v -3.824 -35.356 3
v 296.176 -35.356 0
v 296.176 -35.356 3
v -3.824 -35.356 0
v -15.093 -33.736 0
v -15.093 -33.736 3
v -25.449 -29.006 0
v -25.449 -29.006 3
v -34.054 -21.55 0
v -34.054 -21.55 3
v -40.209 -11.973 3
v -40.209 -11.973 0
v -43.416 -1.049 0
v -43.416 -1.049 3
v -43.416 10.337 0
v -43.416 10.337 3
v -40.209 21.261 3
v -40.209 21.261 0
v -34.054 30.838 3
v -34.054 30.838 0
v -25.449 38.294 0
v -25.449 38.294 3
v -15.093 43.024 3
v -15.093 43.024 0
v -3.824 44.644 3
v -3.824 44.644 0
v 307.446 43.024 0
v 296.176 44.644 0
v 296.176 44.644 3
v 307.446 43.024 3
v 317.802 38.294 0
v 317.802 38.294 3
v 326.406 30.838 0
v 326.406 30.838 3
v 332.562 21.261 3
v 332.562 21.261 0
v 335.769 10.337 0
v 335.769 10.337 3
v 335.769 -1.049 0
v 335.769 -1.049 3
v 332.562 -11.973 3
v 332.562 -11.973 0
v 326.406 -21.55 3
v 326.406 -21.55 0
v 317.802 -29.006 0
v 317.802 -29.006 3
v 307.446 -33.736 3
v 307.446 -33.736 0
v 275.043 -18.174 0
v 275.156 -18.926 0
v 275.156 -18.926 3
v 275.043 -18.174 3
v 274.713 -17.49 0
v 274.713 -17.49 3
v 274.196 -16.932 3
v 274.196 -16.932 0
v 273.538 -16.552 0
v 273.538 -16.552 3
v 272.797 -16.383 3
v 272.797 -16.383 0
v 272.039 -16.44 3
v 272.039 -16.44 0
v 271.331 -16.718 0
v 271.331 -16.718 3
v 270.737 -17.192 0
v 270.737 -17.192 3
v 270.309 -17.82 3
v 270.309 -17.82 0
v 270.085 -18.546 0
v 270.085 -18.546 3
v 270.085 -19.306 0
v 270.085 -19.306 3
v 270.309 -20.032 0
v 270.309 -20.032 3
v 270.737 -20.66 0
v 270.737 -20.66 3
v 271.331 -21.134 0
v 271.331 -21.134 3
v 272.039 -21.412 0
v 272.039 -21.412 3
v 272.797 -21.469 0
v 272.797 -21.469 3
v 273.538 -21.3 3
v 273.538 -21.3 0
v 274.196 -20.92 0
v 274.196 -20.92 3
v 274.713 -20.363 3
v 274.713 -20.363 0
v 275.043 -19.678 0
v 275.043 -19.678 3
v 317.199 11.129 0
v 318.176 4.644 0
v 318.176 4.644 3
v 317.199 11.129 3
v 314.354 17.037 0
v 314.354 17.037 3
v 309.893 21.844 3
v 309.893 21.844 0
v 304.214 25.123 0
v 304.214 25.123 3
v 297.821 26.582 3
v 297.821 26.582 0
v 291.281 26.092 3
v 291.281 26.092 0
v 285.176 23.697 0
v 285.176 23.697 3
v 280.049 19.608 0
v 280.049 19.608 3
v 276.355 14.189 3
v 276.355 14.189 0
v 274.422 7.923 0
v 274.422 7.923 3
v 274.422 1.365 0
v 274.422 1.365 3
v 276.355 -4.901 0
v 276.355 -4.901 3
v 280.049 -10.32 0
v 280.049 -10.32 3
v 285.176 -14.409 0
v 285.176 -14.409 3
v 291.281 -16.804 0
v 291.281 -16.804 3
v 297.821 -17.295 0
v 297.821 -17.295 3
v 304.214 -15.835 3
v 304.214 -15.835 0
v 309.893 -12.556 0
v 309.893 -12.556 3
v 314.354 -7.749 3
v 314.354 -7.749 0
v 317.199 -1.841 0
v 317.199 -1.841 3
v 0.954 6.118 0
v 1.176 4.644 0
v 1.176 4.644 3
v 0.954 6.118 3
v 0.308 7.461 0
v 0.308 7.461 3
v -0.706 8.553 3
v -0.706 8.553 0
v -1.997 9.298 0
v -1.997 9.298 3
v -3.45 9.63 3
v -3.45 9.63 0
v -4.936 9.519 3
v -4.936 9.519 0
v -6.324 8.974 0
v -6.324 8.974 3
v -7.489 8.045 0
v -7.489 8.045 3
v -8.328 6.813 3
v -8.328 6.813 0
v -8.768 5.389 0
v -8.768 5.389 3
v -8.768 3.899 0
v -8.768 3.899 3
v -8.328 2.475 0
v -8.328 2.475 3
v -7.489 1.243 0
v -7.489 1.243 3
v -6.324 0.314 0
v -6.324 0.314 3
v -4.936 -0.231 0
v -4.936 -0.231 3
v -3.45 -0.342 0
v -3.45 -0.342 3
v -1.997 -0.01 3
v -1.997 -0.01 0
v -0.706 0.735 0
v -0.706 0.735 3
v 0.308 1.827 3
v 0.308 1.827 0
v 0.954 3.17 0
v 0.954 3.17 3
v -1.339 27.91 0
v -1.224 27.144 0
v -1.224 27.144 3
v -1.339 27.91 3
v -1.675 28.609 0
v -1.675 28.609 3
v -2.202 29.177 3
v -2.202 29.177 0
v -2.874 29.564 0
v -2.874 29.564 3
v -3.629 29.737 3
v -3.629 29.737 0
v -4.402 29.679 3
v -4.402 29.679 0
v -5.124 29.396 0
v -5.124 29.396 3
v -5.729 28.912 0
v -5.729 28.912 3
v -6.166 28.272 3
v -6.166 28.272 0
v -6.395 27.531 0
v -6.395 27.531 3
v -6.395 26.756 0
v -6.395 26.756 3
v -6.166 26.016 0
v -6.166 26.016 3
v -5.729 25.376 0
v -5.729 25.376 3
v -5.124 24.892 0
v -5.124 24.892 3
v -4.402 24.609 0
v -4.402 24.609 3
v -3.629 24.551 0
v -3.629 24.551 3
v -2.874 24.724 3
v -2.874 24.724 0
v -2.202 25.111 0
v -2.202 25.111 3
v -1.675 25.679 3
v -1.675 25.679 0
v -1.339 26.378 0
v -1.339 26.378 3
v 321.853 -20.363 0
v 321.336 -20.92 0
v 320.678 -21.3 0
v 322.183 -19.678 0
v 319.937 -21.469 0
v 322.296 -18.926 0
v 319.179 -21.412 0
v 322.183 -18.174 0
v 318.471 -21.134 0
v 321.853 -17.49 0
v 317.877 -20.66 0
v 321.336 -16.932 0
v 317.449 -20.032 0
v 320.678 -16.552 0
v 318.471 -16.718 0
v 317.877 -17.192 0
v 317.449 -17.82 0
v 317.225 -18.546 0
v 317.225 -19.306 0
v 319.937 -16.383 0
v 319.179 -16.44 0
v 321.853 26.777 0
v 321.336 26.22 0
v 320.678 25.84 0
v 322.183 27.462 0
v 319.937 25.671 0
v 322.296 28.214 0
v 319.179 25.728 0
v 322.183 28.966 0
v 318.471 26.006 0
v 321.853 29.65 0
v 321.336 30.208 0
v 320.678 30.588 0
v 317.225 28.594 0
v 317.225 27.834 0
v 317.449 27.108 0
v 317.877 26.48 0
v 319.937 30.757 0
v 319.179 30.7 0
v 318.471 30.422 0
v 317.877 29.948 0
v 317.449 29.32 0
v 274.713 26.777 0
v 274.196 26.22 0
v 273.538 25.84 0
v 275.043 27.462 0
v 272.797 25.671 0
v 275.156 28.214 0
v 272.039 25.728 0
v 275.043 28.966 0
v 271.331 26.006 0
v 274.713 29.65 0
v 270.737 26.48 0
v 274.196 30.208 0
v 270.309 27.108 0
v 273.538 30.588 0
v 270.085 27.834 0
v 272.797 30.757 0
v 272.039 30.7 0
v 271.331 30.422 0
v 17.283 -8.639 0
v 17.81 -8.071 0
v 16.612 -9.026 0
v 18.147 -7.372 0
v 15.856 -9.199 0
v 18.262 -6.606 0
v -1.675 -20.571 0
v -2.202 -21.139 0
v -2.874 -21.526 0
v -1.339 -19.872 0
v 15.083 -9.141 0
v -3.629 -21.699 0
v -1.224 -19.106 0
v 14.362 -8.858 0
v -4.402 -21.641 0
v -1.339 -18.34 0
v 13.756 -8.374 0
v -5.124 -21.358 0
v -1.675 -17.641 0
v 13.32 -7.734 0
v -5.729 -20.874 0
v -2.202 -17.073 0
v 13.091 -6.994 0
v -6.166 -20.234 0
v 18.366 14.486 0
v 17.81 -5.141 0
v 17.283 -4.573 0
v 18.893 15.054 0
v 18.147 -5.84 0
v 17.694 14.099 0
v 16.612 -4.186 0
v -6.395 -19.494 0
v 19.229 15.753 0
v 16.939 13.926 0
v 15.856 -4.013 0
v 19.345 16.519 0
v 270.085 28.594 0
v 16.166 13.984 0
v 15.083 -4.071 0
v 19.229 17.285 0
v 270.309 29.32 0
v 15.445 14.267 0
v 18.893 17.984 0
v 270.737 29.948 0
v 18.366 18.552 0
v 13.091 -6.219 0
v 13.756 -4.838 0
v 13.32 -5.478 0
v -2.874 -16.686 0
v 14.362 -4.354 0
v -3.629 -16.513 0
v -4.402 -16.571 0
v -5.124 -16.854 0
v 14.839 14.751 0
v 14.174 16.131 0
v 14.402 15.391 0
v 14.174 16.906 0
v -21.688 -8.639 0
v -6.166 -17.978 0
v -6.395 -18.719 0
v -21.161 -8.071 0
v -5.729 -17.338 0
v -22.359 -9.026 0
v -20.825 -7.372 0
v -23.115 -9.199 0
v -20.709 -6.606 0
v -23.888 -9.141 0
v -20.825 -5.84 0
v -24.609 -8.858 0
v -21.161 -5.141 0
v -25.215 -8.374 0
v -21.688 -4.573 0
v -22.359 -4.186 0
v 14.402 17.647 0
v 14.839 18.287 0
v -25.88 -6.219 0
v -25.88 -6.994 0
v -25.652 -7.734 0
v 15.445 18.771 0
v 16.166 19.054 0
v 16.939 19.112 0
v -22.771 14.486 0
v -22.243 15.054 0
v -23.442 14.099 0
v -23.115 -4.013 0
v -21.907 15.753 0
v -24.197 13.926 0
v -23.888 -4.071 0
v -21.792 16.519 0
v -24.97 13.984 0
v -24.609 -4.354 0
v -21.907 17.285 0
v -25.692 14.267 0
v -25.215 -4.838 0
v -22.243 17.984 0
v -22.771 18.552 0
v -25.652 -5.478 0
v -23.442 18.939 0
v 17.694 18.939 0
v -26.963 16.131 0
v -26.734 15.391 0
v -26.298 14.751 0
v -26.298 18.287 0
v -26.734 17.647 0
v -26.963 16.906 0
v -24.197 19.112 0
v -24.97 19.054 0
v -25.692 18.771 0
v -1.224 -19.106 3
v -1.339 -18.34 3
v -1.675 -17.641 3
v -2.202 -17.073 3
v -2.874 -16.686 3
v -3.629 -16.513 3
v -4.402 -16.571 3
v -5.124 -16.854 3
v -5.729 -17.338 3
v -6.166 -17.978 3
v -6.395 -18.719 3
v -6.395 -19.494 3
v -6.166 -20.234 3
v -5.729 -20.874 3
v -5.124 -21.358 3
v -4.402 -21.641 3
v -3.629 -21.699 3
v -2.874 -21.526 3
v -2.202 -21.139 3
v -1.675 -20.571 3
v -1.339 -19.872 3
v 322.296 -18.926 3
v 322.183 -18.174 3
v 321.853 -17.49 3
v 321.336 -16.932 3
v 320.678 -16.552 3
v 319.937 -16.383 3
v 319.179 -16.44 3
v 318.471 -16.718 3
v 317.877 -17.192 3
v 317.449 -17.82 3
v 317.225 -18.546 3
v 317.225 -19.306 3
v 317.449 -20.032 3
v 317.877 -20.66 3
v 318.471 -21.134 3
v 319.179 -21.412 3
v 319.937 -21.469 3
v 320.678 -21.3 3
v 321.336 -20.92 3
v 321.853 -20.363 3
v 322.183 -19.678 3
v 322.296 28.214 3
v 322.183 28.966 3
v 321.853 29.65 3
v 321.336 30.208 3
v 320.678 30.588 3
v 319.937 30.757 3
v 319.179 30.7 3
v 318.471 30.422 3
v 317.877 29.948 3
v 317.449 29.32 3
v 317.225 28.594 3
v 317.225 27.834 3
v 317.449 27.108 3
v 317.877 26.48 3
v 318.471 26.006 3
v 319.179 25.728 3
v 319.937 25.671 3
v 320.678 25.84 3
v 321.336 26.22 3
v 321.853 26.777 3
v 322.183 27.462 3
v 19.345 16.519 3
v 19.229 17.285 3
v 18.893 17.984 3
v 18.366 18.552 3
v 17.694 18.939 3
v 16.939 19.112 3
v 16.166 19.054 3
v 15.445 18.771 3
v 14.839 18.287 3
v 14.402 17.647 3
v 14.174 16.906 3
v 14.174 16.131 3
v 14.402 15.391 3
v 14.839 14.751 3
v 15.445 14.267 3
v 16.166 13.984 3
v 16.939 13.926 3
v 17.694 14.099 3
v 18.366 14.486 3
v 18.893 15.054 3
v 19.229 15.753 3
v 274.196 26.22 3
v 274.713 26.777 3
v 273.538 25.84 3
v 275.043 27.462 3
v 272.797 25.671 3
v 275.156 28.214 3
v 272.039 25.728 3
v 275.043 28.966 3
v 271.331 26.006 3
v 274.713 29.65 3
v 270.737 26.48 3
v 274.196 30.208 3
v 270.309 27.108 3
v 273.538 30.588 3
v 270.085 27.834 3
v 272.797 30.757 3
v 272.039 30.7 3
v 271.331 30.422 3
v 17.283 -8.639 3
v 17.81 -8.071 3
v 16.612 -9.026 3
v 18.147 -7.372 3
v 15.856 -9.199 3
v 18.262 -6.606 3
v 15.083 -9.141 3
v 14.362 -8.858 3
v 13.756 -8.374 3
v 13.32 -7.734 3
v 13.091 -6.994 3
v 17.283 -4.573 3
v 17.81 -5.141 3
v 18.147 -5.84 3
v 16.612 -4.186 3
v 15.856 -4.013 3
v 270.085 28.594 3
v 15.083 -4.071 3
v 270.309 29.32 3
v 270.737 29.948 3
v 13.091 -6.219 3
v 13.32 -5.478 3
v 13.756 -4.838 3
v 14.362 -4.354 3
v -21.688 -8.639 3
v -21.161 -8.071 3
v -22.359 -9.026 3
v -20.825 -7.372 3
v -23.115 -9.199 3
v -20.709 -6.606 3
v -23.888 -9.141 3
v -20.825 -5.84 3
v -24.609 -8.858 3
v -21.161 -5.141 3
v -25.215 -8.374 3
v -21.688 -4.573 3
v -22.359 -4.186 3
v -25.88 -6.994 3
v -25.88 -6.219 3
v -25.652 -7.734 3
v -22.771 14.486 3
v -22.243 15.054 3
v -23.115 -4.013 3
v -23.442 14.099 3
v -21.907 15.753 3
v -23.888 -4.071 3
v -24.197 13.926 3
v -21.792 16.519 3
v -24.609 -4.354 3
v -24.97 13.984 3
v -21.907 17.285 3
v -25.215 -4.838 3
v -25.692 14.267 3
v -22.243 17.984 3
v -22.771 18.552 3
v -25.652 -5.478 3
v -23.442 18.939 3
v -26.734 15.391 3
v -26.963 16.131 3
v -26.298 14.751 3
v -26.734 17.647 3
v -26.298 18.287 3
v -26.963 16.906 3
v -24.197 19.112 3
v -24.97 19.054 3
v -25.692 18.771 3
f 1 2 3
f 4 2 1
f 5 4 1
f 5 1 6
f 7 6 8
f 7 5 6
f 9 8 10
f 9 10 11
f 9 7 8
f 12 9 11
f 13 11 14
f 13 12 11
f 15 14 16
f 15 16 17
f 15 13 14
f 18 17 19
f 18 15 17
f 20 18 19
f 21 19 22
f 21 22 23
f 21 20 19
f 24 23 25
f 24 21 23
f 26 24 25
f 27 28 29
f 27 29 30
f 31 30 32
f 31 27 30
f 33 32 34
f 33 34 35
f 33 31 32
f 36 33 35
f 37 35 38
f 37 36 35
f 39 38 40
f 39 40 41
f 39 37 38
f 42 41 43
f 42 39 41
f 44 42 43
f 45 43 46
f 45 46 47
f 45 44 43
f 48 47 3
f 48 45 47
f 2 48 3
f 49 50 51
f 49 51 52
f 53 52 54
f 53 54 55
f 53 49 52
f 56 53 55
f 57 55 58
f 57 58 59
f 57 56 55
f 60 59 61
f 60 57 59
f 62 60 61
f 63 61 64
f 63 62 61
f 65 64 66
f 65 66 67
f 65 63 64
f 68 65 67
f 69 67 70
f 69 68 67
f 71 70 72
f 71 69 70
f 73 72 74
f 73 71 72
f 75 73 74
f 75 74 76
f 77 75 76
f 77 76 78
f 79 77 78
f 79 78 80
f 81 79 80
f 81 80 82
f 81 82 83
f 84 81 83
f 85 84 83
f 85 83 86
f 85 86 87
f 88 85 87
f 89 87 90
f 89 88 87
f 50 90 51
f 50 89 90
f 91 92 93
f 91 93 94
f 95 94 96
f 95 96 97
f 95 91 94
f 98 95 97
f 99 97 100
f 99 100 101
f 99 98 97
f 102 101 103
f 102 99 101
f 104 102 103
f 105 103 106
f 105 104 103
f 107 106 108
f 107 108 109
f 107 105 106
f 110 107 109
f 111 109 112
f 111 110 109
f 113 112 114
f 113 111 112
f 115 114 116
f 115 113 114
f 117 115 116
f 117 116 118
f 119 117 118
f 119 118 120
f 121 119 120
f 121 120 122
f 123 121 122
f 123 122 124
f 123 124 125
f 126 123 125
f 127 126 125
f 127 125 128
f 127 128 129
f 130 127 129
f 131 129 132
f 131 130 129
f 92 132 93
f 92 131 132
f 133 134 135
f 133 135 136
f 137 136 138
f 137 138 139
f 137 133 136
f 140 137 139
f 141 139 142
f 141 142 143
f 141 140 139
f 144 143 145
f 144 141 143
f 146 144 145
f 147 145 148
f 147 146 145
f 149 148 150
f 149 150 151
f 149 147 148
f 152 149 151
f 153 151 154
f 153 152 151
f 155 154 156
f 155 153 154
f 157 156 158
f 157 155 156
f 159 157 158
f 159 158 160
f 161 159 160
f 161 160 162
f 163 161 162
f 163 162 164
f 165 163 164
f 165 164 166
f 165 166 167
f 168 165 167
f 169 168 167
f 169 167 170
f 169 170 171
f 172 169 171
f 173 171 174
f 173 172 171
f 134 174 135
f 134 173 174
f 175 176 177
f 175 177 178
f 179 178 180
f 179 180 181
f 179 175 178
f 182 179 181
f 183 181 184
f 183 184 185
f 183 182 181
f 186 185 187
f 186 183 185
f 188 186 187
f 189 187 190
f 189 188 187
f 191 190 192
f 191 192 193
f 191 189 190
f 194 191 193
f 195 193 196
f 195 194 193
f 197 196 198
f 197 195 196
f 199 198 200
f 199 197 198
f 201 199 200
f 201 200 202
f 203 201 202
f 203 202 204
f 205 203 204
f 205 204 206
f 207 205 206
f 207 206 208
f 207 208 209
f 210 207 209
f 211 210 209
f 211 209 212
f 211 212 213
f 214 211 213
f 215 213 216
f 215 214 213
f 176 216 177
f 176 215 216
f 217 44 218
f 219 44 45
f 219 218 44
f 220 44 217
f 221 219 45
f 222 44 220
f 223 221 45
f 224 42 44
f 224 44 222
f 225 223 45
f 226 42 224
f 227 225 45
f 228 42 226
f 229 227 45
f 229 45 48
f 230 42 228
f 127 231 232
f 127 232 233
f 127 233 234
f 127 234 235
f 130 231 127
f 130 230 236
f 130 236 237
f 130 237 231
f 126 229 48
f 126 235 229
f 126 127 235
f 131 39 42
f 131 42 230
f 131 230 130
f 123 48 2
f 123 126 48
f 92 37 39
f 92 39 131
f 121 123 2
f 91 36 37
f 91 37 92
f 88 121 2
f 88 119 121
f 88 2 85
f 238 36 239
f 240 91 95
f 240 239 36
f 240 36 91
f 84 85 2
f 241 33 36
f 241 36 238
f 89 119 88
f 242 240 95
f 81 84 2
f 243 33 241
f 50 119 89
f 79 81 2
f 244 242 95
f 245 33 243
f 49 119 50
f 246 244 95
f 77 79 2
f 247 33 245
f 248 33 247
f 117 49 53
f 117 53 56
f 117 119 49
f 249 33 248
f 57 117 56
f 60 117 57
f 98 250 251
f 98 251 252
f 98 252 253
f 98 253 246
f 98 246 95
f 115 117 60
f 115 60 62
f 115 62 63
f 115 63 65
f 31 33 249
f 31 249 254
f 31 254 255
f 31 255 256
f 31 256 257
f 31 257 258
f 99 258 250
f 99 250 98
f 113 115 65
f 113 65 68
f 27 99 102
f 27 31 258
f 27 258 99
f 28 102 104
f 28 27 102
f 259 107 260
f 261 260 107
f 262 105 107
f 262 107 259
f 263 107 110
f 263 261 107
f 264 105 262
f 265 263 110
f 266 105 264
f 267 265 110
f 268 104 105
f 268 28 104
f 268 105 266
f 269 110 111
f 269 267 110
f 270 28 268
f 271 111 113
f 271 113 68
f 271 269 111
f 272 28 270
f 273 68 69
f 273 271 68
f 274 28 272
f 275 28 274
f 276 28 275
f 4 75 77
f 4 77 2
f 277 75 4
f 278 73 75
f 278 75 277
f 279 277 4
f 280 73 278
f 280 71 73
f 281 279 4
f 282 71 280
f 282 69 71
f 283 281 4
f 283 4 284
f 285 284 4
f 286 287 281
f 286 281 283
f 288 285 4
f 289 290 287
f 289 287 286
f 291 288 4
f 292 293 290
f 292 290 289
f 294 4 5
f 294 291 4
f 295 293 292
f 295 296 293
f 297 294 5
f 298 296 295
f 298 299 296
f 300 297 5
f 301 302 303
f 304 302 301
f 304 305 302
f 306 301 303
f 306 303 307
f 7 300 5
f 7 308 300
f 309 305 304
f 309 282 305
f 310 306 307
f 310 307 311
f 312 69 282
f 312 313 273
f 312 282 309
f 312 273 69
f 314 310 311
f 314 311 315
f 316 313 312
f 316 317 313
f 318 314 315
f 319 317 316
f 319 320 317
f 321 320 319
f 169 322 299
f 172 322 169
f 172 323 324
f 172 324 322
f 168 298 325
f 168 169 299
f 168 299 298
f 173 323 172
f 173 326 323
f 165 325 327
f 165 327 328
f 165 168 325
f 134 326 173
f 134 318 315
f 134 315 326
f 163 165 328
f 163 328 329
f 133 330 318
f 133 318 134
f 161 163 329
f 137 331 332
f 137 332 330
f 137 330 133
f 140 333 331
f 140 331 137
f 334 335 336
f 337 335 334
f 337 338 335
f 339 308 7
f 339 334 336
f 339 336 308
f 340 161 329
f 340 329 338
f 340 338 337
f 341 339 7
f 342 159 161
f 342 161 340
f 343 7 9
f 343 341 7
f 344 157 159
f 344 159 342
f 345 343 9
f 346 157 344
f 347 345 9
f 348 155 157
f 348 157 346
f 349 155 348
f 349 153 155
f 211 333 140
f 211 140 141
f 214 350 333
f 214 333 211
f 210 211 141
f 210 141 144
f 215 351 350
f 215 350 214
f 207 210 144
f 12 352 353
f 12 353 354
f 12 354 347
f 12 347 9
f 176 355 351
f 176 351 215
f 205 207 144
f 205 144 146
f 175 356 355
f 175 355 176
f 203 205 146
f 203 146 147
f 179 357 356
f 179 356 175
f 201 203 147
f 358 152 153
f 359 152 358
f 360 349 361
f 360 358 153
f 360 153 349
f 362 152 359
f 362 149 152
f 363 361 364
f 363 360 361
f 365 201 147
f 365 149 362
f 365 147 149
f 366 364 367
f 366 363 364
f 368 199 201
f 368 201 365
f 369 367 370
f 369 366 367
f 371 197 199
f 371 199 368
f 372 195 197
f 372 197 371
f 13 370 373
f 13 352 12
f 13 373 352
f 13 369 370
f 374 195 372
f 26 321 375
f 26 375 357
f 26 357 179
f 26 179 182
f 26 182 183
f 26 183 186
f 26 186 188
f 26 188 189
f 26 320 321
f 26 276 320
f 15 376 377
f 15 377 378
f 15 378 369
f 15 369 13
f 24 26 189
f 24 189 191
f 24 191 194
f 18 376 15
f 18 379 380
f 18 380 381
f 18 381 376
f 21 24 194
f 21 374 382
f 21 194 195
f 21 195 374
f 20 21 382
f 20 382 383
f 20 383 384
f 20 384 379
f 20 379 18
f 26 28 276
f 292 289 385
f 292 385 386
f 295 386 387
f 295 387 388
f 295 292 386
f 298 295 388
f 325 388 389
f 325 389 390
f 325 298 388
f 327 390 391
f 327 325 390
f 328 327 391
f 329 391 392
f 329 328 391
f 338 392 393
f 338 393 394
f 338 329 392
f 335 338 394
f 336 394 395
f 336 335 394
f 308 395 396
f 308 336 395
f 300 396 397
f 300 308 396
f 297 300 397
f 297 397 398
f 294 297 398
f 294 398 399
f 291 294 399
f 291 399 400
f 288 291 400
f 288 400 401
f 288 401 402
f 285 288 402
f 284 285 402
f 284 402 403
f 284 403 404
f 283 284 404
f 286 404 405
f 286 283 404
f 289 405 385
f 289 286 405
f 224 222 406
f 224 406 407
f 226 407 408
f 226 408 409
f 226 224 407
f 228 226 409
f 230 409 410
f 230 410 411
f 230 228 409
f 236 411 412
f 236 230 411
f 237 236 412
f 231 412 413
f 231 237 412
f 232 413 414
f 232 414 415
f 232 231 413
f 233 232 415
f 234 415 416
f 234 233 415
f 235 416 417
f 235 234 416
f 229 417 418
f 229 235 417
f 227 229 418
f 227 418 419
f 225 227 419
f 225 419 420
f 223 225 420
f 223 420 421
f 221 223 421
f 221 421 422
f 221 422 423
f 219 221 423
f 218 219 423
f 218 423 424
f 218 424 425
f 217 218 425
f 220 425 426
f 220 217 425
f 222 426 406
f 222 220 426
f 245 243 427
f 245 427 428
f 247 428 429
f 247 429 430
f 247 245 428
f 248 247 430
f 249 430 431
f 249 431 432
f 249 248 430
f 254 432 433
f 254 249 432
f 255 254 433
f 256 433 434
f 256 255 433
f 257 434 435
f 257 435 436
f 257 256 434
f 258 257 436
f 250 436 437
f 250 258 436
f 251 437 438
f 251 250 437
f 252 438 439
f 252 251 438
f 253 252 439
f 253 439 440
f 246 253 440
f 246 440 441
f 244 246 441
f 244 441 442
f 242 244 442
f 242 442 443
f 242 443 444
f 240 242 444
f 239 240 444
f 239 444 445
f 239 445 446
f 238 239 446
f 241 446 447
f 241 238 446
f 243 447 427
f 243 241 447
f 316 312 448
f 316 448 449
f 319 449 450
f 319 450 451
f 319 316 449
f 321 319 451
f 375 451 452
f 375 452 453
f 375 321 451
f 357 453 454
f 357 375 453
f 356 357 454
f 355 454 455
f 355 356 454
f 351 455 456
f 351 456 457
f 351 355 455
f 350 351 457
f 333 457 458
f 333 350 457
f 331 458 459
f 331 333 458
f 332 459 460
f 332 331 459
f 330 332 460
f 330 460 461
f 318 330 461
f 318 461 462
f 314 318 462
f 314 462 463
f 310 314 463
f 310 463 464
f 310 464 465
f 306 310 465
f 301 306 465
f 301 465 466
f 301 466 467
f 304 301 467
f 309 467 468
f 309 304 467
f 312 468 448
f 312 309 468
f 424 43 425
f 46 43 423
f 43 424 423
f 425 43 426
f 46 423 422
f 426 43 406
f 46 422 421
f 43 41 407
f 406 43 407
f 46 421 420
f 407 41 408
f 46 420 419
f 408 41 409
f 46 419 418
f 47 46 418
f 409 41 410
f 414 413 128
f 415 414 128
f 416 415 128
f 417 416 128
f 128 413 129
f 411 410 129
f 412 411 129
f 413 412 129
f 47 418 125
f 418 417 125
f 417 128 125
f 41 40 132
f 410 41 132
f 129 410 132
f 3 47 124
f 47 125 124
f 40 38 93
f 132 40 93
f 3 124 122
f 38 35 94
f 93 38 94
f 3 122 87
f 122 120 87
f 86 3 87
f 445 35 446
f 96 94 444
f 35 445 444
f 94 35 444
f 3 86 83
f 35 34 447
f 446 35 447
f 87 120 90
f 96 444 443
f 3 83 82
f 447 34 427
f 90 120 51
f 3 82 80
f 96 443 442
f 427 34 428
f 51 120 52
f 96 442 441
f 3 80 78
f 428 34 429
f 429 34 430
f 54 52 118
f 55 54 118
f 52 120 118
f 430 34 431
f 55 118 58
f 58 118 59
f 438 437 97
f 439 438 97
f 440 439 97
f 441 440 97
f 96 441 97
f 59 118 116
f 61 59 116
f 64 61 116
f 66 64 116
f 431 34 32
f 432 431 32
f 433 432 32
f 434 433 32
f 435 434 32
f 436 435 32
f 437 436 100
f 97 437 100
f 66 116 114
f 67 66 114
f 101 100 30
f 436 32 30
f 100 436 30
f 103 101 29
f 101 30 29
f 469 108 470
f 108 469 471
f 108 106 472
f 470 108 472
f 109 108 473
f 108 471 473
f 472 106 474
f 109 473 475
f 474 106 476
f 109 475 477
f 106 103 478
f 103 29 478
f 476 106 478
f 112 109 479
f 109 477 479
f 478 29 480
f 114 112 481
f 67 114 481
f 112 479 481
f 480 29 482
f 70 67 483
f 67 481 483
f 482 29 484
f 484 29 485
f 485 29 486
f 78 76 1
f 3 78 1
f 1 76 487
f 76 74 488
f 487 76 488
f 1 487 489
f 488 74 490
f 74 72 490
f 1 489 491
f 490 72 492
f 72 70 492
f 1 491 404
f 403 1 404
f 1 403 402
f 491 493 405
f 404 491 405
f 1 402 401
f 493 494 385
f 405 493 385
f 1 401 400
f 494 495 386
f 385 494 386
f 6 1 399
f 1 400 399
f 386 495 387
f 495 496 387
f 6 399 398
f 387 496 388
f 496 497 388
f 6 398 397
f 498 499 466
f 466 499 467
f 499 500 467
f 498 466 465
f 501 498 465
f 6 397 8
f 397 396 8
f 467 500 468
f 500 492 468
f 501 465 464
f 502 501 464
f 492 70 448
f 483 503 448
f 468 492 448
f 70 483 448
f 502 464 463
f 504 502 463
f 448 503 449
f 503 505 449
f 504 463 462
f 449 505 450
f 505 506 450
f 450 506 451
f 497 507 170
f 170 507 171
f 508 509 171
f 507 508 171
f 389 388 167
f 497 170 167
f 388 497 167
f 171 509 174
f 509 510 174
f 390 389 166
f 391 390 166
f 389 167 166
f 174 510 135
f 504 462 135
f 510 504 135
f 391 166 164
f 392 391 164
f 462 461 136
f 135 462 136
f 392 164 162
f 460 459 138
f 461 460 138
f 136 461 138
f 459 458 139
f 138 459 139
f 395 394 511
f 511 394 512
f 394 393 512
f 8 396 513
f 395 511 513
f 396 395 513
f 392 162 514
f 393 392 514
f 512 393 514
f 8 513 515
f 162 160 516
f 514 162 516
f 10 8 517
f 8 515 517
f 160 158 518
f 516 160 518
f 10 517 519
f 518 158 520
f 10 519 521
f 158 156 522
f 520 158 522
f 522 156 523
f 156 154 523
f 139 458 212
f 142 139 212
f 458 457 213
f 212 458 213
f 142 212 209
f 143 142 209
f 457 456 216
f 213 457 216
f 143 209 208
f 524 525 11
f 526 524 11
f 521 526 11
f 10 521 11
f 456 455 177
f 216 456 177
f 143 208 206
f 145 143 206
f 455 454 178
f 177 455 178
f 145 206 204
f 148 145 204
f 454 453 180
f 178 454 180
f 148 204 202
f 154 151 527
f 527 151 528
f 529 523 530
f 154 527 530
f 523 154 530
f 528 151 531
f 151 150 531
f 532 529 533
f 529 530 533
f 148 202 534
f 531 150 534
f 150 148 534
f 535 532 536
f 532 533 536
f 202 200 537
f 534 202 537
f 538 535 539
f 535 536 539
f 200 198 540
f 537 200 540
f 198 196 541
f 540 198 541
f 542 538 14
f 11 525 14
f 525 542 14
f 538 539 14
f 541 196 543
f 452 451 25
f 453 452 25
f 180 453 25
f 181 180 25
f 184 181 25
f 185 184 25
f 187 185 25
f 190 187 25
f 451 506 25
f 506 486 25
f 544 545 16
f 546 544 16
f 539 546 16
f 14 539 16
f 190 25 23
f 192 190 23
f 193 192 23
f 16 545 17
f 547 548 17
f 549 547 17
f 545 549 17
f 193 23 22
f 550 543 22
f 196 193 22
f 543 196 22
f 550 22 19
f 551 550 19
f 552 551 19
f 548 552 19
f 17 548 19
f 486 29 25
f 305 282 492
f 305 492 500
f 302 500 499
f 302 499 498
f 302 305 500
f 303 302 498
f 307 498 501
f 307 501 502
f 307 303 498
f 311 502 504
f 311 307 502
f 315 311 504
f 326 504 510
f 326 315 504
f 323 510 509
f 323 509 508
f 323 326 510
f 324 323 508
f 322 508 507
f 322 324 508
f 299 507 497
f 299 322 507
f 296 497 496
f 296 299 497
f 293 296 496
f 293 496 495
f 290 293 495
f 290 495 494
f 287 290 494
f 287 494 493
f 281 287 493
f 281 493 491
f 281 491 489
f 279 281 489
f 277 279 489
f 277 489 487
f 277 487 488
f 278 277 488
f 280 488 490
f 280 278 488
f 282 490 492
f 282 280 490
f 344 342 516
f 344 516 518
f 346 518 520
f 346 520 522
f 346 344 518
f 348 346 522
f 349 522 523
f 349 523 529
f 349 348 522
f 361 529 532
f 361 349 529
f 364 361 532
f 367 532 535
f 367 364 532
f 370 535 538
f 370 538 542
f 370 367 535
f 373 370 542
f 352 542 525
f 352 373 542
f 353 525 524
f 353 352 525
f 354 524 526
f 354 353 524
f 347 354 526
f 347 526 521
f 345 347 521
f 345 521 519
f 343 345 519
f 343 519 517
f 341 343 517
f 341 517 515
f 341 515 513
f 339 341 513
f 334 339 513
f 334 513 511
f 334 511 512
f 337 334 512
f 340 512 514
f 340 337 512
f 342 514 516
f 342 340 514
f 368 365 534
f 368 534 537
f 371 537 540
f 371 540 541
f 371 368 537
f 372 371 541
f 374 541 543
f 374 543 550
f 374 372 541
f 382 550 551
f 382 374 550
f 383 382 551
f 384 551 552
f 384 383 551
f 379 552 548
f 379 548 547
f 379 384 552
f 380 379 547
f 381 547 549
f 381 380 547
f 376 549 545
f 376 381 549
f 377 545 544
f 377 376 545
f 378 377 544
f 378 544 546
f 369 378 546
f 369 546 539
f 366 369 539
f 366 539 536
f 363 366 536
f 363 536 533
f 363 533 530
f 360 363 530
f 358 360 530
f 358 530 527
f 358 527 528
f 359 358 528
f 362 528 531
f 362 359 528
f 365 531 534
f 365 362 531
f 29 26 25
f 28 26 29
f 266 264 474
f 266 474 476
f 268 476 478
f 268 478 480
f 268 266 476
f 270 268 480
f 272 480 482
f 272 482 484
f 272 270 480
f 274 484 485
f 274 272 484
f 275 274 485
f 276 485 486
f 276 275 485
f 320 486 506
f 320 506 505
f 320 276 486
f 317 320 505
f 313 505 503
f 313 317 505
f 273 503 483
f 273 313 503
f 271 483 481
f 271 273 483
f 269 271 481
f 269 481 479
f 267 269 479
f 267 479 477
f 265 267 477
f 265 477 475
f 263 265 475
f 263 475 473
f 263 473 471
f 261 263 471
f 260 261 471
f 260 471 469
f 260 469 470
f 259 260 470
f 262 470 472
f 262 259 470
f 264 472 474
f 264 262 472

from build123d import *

# Parameters (mm, degrees)
SKETCH_1_R      = 2.6
SKETCH_1_R_2    = 5
SKETCH_1_R_3    = 22
SKETCH_1_R_4    = 2.55
EXTRUDE_1_DEPTH = 3


with BuildPart() as part:
    # 草图1 → 凸台-拉伸1 (new body)
    with BuildSketch(Plane.XY):
        with BuildLine():
            Line((-3.823548363, 44.643956065), (296.176451637, 44.643956065))
            ThreePointArc((296.176451637, 44.643956065), (336.176451637, 4.643956065), (296.176451637, -35.356043935))
            Line((296.176451637, -35.356043935), (-3.823548363, -35.356043935))
            ThreePointArc((-3.823548363, -35.356043935), (-43.823548363, 4.643956065), (-3.823548363, 44.643956065))
        make_face()
        with Locations((-3.823548363, -19.106043935)):
            Circle(SKETCH_1_R, mode=Mode.SUBTRACT)
        with Locations((15.662023222, -6.606043935)):
            Circle(SKETCH_1_R, mode=Mode.SUBTRACT)
        with Locations((-3.823548363, 4.643956065)):
            Circle(SKETCH_1_R_2, mode=Mode.SUBTRACT)
        with Locations((296.176451637, 4.643956065)):
            Circle(SKETCH_1_R_3, mode=Mode.SUBTRACT)
        with Locations((272.606451637, 28.213956065)):
            Circle(SKETCH_1_R_4, mode=Mode.SUBTRACT)
        with Locations((319.746451637, 28.213956065)):
            Circle(SKETCH_1_R_4, mode=Mode.SUBTRACT)
        with Locations((319.746451637, -18.926043935)):
            Circle(SKETCH_1_R_4, mode=Mode.SUBTRACT)
        with Locations((272.606451637, -18.926043935)):
            Circle(SKETCH_1_R_4, mode=Mode.SUBTRACT)
        with Locations((-24.391651703, 16.518956065)):
            Circle(SKETCH_1_R, mode=Mode.SUBTRACT)
        with Locations((16.744554977, 16.518956065)):
            Circle(SKETCH_1_R, mode=Mode.SUBTRACT)
        with Locations((-23.309119948, -6.606043935)):
            Circle(SKETCH_1_R, mode=Mode.SUBTRACT)
        with Locations((-3.823548363, 27.143956065)):
            Circle(SKETCH_1_R, mode=Mode.SUBTRACT)
    extrude(amount=EXTRUDE_1_DEPTH)


solid = part.part
